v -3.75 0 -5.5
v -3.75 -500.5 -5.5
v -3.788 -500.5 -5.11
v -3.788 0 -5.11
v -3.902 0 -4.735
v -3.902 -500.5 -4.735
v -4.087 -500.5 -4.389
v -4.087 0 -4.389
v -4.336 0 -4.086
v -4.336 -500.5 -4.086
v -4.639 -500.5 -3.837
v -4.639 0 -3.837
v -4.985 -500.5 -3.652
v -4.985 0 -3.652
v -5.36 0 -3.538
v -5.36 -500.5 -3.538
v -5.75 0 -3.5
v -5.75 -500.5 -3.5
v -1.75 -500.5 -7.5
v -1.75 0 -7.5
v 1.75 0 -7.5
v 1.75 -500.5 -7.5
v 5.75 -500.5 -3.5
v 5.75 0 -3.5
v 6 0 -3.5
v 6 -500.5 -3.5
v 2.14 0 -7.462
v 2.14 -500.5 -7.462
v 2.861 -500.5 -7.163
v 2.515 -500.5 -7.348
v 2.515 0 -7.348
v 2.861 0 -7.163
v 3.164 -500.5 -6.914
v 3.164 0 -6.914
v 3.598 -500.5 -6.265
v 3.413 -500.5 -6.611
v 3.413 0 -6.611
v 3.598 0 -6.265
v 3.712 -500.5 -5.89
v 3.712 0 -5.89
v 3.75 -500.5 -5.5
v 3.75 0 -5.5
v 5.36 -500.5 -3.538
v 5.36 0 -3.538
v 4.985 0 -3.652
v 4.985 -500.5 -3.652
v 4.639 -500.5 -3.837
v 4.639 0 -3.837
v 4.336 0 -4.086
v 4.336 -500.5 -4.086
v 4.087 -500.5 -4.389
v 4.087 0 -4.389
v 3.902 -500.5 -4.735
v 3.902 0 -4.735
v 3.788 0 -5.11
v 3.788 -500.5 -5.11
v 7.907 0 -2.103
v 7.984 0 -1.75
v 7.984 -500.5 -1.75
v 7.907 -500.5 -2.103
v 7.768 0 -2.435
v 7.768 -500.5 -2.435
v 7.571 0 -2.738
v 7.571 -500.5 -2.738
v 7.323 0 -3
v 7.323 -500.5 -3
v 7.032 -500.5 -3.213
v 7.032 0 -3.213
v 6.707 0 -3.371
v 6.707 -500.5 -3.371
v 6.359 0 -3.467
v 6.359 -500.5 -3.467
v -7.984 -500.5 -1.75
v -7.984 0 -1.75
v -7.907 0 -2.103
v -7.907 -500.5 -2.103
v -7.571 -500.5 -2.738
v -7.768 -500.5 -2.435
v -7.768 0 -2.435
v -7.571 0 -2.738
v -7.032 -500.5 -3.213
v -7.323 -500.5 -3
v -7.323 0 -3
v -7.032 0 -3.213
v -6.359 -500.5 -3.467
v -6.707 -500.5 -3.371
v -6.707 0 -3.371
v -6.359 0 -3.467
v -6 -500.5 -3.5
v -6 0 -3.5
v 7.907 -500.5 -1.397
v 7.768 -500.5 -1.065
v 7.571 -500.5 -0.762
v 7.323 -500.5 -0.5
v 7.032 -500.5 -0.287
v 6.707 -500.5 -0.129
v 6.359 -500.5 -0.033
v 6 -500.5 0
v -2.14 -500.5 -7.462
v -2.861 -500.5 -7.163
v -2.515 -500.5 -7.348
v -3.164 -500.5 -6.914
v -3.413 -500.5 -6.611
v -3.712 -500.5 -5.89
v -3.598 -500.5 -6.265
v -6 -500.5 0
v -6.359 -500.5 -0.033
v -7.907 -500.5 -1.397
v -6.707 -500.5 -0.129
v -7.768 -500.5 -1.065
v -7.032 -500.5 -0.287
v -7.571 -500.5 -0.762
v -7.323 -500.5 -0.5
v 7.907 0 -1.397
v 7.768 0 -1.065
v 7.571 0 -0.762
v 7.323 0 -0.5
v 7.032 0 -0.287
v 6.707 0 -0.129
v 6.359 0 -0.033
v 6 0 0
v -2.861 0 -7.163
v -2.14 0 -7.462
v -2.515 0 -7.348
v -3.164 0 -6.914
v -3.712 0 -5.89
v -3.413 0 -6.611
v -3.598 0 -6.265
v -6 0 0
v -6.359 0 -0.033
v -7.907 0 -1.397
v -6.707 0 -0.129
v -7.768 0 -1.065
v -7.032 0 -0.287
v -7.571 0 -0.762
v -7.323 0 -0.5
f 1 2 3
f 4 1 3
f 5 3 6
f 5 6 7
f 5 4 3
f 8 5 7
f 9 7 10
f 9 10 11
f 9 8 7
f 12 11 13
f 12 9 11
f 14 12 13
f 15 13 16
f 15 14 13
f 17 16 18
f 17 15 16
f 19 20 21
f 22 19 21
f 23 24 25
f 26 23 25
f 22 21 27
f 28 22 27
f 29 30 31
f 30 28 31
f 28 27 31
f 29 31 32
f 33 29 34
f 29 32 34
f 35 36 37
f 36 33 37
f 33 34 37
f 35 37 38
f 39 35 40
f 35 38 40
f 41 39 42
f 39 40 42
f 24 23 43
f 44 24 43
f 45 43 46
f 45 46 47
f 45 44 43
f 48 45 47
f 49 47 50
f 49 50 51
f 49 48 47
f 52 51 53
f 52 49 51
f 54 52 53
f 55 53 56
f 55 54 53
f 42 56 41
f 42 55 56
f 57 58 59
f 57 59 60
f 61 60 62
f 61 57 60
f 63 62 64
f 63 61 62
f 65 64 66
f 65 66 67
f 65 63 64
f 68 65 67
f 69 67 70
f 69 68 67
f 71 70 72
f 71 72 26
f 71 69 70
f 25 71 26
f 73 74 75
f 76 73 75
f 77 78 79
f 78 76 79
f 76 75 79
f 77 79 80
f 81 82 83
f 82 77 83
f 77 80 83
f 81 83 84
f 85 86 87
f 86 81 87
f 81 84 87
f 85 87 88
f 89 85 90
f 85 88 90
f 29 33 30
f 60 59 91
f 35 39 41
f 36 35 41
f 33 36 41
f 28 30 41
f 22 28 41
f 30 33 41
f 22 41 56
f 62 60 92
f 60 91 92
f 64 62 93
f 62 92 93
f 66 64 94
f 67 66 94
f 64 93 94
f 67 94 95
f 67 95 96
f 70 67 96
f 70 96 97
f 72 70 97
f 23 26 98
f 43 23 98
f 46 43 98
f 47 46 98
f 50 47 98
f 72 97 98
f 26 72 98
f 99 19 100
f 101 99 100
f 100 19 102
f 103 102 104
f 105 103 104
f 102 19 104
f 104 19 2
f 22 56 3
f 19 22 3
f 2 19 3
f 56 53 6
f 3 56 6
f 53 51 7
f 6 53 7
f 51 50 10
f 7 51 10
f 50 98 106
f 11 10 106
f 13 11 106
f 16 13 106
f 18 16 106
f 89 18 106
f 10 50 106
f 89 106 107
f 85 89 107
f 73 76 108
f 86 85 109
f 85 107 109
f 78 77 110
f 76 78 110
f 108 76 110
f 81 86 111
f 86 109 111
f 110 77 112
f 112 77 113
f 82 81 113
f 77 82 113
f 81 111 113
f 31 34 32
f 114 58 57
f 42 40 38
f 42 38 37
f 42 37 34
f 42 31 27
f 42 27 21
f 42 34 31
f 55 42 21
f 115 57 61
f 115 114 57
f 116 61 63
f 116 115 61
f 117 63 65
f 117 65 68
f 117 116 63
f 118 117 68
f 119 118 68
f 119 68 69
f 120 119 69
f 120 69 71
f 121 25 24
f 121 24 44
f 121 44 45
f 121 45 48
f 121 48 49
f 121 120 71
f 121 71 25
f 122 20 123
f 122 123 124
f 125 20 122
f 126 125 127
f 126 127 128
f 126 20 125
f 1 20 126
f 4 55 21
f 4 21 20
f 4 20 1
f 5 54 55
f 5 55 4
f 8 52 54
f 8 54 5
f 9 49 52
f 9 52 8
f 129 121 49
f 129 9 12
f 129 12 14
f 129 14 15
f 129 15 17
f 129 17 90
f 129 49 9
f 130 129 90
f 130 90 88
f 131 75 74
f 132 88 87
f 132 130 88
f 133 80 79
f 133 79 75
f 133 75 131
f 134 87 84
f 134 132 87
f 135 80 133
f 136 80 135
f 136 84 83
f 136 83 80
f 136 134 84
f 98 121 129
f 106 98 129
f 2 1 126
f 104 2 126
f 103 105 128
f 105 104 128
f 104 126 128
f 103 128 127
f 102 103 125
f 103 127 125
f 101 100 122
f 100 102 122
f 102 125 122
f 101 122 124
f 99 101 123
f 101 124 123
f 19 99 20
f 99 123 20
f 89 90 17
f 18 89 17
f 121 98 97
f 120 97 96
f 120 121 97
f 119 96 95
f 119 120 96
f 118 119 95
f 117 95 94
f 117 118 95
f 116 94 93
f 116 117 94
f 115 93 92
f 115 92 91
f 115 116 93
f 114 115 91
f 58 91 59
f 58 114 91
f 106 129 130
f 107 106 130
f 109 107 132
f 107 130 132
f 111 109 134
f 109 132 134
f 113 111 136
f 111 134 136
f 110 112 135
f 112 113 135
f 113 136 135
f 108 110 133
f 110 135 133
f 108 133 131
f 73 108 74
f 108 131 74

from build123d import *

# Parameters (mm, degrees)
F1_DEPTH    = 500.5
F2_T1_DEPTH = 500.5
F2_T3_DEPTH = 510.5


# Not quite as in the source:
# - a fillet or chamfer that OpenCascade refuses, or shapes differently, is made with other operations: its cross-section is extruded or revolved along the edge and cut away or added


with BuildPart() as f1:
    # F0 (on Front) → F1 (new body)
    with BuildSketch(Plane.XZ):
        Polygon((8, 0), (0, 0), (-8, 0), (-8, -3.5), (-3.75, -3.5), (-3.75, -7.5), (3.75, -7.5), (3.75, -3.5), (8, -3.5), align=None)
    extrude(amount=F1_DEPTH)

    # F2: fillet of radius 2 on 8 edges, made by hand

    # F2_s2 → F2_t1 (join)
    with BuildSketch(Plane.XZ):
        with BuildLine():
            ThreePointArc((5.75, -3.5), (4.3357864376, -4.0857864376), (3.75, -5.5))
            Line((3.75, -5.5), (3.75, -3.5))
            Line((3.75, -3.5), (5.75, -3.5))
        make_face()
        with BuildLine():
            ThreePointArc((-3.75, -5.5), (-4.3357864376, -4.0857864376), (-5.75, -3.5))
            Line((-5.75, -3.5), (-3.75, -3.5))
            Line((-3.75, -3.5), (-3.75, -5.5))
        make_face()
    extrude(amount=F2_T1_DEPTH)

    # F2_s4 → F2_t3 (cut)
    with BuildSketch(Plane.XZ.offset(-5)):
        with BuildLine():
            ThreePointArc((1.75, -7.5), (3.1642135624, -6.9142135624), (3.75, -5.5))
            Line((3.75, -5.5), (3.75, -7.5))
            Line((3.75, -7.5), (1.75, -7.5))
        make_face()
        with BuildLine():
            ThreePointArc((-3.75, -5.5), (-3.1642135624, -6.9142135624), (-1.75, -7.5))
            Line((-1.75, -7.5), (-3.75, -7.5))
            Line((-3.75, -7.5), (-3.75, -5.5))
        make_face()
        with BuildLine():
            ThreePointArc((-8, -1.5), (-7.4142135624, -2.9142135624), (-6, -3.5))
            Line((-6, -3.5), (-8, -3.5))
            Line((-8, -3.5), (-8, -1.5))
        make_face()
        with BuildLine():
            ThreePointArc((-6, 0), (-7.4142135624, -0.5857864376), (-8, -2))
            Line((-8, -2), (-8, 0))
            Line((-8, 0), (-6, 0))
        make_face()
        with BuildLine():
            ThreePointArc((8, -1.5), (7.4142135624, -2.9142135624), (6, -3.5))
            Line((6, -3.5), (8, -3.5))
            Line((8, -3.5), (8, -1.5))
        make_face()
        with BuildLine():
            ThreePointArc((6, 0), (7.4142135624, -0.5857864376), (8, -2))
            Line((8, -2), (8, 0))
            Line((8, 0), (6, 0))
        make_face()
    extrude(amount=F2_T3_DEPTH, mode=Mode.SUBTRACT)


solid = f1.part
